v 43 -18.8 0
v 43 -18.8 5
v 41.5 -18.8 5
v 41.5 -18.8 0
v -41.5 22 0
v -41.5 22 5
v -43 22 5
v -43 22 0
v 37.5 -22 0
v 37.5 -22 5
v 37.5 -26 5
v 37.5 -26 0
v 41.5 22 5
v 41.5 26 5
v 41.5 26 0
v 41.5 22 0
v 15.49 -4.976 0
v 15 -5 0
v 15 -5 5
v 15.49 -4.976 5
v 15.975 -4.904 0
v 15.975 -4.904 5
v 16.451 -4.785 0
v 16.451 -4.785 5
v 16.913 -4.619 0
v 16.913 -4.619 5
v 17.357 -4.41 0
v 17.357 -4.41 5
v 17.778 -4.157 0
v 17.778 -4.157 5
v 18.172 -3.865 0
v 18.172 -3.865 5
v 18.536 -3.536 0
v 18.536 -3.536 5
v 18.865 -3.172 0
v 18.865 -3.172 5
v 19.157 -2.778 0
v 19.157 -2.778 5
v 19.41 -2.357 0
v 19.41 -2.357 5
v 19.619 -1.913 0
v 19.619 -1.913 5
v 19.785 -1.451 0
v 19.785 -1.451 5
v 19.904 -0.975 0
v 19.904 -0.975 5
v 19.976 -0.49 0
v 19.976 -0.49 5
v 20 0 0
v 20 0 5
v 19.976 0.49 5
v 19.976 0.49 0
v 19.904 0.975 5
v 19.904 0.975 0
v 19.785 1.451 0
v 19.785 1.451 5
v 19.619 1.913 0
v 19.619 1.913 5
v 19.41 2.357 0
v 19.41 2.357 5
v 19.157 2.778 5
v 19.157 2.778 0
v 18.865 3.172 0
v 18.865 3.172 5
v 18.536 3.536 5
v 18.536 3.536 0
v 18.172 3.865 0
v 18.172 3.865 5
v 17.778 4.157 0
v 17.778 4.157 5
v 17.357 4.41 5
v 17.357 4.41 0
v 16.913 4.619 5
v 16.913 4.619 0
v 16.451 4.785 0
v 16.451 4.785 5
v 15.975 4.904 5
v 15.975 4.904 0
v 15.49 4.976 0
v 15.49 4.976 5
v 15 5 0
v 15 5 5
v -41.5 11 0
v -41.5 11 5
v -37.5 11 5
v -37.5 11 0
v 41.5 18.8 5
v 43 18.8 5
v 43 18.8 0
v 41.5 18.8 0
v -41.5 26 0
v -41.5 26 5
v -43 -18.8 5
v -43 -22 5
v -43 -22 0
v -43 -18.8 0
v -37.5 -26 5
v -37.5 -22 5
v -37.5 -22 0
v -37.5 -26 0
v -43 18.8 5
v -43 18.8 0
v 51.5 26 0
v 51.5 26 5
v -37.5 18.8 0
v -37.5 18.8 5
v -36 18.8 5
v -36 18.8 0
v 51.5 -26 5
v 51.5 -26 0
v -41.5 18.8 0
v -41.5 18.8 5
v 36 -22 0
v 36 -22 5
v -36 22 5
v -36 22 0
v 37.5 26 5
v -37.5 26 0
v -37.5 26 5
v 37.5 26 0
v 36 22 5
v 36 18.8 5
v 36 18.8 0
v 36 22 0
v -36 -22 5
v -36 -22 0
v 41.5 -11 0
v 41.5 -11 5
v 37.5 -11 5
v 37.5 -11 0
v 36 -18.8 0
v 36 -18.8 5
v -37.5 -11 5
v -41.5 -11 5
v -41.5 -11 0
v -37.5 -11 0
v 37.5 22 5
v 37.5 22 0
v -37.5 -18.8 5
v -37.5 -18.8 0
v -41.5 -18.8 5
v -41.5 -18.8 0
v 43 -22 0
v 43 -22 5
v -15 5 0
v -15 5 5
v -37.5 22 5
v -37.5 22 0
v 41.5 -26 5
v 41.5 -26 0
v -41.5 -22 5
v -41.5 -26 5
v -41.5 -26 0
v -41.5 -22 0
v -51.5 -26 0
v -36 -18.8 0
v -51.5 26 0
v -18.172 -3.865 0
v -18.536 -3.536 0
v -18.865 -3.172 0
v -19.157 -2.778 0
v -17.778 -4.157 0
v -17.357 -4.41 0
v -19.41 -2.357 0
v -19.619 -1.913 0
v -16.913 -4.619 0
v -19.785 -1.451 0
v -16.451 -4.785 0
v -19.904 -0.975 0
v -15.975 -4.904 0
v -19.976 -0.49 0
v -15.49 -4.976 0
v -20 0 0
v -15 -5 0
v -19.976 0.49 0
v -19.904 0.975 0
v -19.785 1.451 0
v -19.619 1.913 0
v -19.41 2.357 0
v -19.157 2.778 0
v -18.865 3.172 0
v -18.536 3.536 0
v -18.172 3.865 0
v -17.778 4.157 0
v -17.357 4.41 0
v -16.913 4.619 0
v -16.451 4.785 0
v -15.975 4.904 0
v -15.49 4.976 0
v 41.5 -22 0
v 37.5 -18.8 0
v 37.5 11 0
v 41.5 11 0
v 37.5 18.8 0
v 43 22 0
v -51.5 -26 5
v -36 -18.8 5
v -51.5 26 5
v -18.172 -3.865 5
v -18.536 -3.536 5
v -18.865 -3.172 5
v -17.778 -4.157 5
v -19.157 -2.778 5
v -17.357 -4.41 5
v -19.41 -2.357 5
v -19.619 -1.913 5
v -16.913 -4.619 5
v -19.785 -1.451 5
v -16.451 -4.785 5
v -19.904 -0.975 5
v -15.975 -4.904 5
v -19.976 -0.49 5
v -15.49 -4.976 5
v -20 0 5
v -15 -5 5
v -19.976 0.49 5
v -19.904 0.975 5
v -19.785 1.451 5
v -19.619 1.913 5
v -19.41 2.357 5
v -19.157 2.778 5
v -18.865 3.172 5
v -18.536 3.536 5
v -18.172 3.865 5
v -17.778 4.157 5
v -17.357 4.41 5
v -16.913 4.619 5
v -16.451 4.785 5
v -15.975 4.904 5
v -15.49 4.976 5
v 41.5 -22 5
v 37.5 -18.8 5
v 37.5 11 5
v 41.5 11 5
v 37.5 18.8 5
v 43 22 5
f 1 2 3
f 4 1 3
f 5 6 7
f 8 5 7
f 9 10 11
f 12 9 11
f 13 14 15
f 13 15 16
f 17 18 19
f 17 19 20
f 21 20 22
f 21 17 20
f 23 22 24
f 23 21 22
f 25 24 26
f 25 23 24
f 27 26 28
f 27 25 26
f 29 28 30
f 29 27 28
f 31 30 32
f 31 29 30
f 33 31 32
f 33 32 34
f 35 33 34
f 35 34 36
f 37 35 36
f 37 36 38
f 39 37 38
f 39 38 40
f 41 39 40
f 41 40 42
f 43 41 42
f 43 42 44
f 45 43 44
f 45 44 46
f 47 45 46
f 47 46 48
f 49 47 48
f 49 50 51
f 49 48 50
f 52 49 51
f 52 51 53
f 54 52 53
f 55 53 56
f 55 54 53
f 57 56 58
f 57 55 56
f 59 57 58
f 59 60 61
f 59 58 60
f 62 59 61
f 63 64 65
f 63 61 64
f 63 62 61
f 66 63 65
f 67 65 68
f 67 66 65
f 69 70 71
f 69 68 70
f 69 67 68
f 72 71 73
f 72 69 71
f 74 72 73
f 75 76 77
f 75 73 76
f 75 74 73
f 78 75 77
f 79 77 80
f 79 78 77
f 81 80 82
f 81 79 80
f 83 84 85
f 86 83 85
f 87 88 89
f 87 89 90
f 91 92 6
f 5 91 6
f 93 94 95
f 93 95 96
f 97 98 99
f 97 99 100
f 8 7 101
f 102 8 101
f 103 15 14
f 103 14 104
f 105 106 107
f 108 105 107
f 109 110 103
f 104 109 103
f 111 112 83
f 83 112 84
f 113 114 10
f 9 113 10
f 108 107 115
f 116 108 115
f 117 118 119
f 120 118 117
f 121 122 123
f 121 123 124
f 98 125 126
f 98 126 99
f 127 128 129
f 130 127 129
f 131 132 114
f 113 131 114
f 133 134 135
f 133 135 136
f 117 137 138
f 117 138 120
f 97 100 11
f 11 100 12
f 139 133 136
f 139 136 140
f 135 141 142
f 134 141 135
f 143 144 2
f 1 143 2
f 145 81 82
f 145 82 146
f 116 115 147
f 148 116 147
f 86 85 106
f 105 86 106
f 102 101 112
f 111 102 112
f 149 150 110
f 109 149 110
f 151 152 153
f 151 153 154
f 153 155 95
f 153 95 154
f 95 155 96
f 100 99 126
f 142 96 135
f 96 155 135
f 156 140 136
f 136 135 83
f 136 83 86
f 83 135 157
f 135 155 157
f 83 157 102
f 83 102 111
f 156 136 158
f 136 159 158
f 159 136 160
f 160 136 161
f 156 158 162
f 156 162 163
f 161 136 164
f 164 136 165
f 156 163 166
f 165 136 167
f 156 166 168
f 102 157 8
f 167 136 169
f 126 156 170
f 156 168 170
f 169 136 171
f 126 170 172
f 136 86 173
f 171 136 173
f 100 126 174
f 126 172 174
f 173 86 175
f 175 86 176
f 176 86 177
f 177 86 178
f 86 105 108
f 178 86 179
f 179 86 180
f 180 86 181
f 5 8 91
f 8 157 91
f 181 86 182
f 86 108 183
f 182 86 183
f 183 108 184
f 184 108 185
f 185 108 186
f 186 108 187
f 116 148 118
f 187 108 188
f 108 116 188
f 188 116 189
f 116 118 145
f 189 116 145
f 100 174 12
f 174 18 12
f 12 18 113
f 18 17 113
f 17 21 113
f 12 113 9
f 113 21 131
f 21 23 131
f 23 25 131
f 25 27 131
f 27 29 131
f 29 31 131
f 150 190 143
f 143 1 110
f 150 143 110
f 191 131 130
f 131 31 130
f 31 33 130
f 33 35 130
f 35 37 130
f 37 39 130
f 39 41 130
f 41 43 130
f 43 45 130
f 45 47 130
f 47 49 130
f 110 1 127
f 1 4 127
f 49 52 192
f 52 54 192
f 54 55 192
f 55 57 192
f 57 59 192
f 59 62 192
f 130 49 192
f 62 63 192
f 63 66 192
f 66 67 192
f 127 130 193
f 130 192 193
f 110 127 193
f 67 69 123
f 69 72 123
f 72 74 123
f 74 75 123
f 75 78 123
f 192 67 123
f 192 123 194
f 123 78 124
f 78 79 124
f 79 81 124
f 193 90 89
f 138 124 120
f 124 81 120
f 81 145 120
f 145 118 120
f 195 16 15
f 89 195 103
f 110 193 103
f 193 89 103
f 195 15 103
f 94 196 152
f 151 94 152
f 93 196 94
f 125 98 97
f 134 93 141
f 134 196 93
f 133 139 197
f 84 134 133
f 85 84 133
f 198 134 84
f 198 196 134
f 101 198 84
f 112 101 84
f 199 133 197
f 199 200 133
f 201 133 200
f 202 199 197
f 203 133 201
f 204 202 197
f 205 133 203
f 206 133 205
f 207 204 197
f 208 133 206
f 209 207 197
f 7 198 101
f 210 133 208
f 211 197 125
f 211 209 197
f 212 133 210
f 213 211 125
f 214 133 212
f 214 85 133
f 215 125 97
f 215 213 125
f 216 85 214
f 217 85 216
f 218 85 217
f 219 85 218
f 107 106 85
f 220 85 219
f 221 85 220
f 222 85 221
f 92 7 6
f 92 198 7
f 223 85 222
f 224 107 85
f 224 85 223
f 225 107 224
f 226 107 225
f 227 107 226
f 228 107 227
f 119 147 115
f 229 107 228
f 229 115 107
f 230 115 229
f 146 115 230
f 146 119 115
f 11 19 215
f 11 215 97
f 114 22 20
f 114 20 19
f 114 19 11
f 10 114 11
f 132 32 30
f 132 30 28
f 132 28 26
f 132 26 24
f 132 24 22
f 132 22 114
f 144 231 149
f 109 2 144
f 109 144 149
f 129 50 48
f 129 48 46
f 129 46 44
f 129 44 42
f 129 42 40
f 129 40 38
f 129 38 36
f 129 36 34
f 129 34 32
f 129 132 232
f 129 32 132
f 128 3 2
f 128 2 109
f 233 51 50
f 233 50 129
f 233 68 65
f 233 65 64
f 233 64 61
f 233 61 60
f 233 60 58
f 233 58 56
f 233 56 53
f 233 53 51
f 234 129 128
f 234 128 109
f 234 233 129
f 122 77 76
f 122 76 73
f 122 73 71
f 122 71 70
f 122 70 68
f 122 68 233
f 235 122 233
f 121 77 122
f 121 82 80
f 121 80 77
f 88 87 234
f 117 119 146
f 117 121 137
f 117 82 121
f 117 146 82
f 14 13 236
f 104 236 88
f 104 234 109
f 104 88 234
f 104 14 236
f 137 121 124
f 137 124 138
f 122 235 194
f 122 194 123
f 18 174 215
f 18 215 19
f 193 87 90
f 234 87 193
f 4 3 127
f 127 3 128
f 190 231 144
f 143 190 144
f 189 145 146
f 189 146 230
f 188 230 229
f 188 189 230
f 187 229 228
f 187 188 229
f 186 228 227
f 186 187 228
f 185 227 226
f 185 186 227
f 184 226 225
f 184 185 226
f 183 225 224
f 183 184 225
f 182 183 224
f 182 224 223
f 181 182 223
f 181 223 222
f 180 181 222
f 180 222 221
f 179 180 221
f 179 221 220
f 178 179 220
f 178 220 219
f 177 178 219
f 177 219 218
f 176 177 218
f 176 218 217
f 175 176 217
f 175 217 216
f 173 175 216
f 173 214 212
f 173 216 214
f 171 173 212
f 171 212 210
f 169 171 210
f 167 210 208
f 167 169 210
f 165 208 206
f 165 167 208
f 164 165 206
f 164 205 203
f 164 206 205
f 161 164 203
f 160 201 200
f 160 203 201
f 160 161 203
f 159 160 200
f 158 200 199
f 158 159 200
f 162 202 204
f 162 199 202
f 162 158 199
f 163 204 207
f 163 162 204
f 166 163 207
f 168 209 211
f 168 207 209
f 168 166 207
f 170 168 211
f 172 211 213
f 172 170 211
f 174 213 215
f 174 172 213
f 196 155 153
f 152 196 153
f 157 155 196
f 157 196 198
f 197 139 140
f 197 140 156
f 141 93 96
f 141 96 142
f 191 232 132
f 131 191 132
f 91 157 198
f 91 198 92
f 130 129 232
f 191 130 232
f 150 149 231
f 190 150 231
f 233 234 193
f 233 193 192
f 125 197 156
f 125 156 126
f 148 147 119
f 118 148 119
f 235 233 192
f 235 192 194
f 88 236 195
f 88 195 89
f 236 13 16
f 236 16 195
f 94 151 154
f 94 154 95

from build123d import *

# Parameters (mm, degrees)
SKETCH1_W           = 103
SKETCH1_H           = 52
BOSS_EXTRUDE1_DEPTH = 5
CUT_EXTRUDE1_DEPTH  = 10
CUT_EXTRUDE2_DEPTH  = 10


with BuildPart() as part:
    # Sketch1 → Boss-Extrude1 (new body)
    with BuildSketch(Plane.XY):
        Rectangle(SKETCH1_W, SKETCH1_H)
    extrude(amount=BOSS_EXTRUDE1_DEPTH)

    # Sketch2 → Cut-Extrude1 (cut)
    with BuildSketch(Plane.XY.offset(5)):
        Polygon((41.5, -26), (41.5, -22), (43, -22), (43, -18.8), (41.5, -18.8), (41.5, -11), (37.5, -11), (37.5, -18.8), (36, -18.8), (36, -22), (37.5, -22), (37.5, -26), align=None)
        Polygon((37.5, 26), (41.5, 26), (41.5, 22), (43, 22), (43, 18.8), (41.5, 18.8), (41.5, 11), (37.5, 11), (37.5, 18.8), (36, 18.8), (36, 22), (37.5, 22), align=None)
        Polygon((-37.5, -26), (-41.5, -26), (-41.5, -22), (-43, -22), (-43, -18.8), (-41.5, -18.8), (-41.5, -11), (-37.5, -11), (-37.5, -18.8), (-36, -18.8), (-36, -22), (-37.5, -22), align=None)
        Polygon((-41.5, 26), (-41.5, 22), (-43, 22), (-43, 18.8), (-41.5, 18.8), (-41.5, 11), (-37.5, 11), (-37.5, 18.8), (-36, 18.8), (-36, 22), (-37.5, 22), (-37.5, 26), align=None)
    extrude(amount=-CUT_EXTRUDE1_DEPTH, mode=Mode.SUBTRACT)

    # Sketch3 → Cut-Extrude2 (cut)
    with BuildSketch(Plane(origin=(0, 0, 0), x_dir=(-1, 0, 0), z_dir=(0, 0, -1))):
        with BuildLine():
            Line((-15, 5), (15, 5))
            ThreePointArc((15, 5), (20, 0), (15, -5))
            Line((15, -5), (-15, -5))
            ThreePointArc((-15, -5), (-20, 0), (-15, 5))
        make_face()
    extrude(amount=-CUT_EXTRUDE2_DEPTH, mode=Mode.SUBTRACT)


solid = part.part
